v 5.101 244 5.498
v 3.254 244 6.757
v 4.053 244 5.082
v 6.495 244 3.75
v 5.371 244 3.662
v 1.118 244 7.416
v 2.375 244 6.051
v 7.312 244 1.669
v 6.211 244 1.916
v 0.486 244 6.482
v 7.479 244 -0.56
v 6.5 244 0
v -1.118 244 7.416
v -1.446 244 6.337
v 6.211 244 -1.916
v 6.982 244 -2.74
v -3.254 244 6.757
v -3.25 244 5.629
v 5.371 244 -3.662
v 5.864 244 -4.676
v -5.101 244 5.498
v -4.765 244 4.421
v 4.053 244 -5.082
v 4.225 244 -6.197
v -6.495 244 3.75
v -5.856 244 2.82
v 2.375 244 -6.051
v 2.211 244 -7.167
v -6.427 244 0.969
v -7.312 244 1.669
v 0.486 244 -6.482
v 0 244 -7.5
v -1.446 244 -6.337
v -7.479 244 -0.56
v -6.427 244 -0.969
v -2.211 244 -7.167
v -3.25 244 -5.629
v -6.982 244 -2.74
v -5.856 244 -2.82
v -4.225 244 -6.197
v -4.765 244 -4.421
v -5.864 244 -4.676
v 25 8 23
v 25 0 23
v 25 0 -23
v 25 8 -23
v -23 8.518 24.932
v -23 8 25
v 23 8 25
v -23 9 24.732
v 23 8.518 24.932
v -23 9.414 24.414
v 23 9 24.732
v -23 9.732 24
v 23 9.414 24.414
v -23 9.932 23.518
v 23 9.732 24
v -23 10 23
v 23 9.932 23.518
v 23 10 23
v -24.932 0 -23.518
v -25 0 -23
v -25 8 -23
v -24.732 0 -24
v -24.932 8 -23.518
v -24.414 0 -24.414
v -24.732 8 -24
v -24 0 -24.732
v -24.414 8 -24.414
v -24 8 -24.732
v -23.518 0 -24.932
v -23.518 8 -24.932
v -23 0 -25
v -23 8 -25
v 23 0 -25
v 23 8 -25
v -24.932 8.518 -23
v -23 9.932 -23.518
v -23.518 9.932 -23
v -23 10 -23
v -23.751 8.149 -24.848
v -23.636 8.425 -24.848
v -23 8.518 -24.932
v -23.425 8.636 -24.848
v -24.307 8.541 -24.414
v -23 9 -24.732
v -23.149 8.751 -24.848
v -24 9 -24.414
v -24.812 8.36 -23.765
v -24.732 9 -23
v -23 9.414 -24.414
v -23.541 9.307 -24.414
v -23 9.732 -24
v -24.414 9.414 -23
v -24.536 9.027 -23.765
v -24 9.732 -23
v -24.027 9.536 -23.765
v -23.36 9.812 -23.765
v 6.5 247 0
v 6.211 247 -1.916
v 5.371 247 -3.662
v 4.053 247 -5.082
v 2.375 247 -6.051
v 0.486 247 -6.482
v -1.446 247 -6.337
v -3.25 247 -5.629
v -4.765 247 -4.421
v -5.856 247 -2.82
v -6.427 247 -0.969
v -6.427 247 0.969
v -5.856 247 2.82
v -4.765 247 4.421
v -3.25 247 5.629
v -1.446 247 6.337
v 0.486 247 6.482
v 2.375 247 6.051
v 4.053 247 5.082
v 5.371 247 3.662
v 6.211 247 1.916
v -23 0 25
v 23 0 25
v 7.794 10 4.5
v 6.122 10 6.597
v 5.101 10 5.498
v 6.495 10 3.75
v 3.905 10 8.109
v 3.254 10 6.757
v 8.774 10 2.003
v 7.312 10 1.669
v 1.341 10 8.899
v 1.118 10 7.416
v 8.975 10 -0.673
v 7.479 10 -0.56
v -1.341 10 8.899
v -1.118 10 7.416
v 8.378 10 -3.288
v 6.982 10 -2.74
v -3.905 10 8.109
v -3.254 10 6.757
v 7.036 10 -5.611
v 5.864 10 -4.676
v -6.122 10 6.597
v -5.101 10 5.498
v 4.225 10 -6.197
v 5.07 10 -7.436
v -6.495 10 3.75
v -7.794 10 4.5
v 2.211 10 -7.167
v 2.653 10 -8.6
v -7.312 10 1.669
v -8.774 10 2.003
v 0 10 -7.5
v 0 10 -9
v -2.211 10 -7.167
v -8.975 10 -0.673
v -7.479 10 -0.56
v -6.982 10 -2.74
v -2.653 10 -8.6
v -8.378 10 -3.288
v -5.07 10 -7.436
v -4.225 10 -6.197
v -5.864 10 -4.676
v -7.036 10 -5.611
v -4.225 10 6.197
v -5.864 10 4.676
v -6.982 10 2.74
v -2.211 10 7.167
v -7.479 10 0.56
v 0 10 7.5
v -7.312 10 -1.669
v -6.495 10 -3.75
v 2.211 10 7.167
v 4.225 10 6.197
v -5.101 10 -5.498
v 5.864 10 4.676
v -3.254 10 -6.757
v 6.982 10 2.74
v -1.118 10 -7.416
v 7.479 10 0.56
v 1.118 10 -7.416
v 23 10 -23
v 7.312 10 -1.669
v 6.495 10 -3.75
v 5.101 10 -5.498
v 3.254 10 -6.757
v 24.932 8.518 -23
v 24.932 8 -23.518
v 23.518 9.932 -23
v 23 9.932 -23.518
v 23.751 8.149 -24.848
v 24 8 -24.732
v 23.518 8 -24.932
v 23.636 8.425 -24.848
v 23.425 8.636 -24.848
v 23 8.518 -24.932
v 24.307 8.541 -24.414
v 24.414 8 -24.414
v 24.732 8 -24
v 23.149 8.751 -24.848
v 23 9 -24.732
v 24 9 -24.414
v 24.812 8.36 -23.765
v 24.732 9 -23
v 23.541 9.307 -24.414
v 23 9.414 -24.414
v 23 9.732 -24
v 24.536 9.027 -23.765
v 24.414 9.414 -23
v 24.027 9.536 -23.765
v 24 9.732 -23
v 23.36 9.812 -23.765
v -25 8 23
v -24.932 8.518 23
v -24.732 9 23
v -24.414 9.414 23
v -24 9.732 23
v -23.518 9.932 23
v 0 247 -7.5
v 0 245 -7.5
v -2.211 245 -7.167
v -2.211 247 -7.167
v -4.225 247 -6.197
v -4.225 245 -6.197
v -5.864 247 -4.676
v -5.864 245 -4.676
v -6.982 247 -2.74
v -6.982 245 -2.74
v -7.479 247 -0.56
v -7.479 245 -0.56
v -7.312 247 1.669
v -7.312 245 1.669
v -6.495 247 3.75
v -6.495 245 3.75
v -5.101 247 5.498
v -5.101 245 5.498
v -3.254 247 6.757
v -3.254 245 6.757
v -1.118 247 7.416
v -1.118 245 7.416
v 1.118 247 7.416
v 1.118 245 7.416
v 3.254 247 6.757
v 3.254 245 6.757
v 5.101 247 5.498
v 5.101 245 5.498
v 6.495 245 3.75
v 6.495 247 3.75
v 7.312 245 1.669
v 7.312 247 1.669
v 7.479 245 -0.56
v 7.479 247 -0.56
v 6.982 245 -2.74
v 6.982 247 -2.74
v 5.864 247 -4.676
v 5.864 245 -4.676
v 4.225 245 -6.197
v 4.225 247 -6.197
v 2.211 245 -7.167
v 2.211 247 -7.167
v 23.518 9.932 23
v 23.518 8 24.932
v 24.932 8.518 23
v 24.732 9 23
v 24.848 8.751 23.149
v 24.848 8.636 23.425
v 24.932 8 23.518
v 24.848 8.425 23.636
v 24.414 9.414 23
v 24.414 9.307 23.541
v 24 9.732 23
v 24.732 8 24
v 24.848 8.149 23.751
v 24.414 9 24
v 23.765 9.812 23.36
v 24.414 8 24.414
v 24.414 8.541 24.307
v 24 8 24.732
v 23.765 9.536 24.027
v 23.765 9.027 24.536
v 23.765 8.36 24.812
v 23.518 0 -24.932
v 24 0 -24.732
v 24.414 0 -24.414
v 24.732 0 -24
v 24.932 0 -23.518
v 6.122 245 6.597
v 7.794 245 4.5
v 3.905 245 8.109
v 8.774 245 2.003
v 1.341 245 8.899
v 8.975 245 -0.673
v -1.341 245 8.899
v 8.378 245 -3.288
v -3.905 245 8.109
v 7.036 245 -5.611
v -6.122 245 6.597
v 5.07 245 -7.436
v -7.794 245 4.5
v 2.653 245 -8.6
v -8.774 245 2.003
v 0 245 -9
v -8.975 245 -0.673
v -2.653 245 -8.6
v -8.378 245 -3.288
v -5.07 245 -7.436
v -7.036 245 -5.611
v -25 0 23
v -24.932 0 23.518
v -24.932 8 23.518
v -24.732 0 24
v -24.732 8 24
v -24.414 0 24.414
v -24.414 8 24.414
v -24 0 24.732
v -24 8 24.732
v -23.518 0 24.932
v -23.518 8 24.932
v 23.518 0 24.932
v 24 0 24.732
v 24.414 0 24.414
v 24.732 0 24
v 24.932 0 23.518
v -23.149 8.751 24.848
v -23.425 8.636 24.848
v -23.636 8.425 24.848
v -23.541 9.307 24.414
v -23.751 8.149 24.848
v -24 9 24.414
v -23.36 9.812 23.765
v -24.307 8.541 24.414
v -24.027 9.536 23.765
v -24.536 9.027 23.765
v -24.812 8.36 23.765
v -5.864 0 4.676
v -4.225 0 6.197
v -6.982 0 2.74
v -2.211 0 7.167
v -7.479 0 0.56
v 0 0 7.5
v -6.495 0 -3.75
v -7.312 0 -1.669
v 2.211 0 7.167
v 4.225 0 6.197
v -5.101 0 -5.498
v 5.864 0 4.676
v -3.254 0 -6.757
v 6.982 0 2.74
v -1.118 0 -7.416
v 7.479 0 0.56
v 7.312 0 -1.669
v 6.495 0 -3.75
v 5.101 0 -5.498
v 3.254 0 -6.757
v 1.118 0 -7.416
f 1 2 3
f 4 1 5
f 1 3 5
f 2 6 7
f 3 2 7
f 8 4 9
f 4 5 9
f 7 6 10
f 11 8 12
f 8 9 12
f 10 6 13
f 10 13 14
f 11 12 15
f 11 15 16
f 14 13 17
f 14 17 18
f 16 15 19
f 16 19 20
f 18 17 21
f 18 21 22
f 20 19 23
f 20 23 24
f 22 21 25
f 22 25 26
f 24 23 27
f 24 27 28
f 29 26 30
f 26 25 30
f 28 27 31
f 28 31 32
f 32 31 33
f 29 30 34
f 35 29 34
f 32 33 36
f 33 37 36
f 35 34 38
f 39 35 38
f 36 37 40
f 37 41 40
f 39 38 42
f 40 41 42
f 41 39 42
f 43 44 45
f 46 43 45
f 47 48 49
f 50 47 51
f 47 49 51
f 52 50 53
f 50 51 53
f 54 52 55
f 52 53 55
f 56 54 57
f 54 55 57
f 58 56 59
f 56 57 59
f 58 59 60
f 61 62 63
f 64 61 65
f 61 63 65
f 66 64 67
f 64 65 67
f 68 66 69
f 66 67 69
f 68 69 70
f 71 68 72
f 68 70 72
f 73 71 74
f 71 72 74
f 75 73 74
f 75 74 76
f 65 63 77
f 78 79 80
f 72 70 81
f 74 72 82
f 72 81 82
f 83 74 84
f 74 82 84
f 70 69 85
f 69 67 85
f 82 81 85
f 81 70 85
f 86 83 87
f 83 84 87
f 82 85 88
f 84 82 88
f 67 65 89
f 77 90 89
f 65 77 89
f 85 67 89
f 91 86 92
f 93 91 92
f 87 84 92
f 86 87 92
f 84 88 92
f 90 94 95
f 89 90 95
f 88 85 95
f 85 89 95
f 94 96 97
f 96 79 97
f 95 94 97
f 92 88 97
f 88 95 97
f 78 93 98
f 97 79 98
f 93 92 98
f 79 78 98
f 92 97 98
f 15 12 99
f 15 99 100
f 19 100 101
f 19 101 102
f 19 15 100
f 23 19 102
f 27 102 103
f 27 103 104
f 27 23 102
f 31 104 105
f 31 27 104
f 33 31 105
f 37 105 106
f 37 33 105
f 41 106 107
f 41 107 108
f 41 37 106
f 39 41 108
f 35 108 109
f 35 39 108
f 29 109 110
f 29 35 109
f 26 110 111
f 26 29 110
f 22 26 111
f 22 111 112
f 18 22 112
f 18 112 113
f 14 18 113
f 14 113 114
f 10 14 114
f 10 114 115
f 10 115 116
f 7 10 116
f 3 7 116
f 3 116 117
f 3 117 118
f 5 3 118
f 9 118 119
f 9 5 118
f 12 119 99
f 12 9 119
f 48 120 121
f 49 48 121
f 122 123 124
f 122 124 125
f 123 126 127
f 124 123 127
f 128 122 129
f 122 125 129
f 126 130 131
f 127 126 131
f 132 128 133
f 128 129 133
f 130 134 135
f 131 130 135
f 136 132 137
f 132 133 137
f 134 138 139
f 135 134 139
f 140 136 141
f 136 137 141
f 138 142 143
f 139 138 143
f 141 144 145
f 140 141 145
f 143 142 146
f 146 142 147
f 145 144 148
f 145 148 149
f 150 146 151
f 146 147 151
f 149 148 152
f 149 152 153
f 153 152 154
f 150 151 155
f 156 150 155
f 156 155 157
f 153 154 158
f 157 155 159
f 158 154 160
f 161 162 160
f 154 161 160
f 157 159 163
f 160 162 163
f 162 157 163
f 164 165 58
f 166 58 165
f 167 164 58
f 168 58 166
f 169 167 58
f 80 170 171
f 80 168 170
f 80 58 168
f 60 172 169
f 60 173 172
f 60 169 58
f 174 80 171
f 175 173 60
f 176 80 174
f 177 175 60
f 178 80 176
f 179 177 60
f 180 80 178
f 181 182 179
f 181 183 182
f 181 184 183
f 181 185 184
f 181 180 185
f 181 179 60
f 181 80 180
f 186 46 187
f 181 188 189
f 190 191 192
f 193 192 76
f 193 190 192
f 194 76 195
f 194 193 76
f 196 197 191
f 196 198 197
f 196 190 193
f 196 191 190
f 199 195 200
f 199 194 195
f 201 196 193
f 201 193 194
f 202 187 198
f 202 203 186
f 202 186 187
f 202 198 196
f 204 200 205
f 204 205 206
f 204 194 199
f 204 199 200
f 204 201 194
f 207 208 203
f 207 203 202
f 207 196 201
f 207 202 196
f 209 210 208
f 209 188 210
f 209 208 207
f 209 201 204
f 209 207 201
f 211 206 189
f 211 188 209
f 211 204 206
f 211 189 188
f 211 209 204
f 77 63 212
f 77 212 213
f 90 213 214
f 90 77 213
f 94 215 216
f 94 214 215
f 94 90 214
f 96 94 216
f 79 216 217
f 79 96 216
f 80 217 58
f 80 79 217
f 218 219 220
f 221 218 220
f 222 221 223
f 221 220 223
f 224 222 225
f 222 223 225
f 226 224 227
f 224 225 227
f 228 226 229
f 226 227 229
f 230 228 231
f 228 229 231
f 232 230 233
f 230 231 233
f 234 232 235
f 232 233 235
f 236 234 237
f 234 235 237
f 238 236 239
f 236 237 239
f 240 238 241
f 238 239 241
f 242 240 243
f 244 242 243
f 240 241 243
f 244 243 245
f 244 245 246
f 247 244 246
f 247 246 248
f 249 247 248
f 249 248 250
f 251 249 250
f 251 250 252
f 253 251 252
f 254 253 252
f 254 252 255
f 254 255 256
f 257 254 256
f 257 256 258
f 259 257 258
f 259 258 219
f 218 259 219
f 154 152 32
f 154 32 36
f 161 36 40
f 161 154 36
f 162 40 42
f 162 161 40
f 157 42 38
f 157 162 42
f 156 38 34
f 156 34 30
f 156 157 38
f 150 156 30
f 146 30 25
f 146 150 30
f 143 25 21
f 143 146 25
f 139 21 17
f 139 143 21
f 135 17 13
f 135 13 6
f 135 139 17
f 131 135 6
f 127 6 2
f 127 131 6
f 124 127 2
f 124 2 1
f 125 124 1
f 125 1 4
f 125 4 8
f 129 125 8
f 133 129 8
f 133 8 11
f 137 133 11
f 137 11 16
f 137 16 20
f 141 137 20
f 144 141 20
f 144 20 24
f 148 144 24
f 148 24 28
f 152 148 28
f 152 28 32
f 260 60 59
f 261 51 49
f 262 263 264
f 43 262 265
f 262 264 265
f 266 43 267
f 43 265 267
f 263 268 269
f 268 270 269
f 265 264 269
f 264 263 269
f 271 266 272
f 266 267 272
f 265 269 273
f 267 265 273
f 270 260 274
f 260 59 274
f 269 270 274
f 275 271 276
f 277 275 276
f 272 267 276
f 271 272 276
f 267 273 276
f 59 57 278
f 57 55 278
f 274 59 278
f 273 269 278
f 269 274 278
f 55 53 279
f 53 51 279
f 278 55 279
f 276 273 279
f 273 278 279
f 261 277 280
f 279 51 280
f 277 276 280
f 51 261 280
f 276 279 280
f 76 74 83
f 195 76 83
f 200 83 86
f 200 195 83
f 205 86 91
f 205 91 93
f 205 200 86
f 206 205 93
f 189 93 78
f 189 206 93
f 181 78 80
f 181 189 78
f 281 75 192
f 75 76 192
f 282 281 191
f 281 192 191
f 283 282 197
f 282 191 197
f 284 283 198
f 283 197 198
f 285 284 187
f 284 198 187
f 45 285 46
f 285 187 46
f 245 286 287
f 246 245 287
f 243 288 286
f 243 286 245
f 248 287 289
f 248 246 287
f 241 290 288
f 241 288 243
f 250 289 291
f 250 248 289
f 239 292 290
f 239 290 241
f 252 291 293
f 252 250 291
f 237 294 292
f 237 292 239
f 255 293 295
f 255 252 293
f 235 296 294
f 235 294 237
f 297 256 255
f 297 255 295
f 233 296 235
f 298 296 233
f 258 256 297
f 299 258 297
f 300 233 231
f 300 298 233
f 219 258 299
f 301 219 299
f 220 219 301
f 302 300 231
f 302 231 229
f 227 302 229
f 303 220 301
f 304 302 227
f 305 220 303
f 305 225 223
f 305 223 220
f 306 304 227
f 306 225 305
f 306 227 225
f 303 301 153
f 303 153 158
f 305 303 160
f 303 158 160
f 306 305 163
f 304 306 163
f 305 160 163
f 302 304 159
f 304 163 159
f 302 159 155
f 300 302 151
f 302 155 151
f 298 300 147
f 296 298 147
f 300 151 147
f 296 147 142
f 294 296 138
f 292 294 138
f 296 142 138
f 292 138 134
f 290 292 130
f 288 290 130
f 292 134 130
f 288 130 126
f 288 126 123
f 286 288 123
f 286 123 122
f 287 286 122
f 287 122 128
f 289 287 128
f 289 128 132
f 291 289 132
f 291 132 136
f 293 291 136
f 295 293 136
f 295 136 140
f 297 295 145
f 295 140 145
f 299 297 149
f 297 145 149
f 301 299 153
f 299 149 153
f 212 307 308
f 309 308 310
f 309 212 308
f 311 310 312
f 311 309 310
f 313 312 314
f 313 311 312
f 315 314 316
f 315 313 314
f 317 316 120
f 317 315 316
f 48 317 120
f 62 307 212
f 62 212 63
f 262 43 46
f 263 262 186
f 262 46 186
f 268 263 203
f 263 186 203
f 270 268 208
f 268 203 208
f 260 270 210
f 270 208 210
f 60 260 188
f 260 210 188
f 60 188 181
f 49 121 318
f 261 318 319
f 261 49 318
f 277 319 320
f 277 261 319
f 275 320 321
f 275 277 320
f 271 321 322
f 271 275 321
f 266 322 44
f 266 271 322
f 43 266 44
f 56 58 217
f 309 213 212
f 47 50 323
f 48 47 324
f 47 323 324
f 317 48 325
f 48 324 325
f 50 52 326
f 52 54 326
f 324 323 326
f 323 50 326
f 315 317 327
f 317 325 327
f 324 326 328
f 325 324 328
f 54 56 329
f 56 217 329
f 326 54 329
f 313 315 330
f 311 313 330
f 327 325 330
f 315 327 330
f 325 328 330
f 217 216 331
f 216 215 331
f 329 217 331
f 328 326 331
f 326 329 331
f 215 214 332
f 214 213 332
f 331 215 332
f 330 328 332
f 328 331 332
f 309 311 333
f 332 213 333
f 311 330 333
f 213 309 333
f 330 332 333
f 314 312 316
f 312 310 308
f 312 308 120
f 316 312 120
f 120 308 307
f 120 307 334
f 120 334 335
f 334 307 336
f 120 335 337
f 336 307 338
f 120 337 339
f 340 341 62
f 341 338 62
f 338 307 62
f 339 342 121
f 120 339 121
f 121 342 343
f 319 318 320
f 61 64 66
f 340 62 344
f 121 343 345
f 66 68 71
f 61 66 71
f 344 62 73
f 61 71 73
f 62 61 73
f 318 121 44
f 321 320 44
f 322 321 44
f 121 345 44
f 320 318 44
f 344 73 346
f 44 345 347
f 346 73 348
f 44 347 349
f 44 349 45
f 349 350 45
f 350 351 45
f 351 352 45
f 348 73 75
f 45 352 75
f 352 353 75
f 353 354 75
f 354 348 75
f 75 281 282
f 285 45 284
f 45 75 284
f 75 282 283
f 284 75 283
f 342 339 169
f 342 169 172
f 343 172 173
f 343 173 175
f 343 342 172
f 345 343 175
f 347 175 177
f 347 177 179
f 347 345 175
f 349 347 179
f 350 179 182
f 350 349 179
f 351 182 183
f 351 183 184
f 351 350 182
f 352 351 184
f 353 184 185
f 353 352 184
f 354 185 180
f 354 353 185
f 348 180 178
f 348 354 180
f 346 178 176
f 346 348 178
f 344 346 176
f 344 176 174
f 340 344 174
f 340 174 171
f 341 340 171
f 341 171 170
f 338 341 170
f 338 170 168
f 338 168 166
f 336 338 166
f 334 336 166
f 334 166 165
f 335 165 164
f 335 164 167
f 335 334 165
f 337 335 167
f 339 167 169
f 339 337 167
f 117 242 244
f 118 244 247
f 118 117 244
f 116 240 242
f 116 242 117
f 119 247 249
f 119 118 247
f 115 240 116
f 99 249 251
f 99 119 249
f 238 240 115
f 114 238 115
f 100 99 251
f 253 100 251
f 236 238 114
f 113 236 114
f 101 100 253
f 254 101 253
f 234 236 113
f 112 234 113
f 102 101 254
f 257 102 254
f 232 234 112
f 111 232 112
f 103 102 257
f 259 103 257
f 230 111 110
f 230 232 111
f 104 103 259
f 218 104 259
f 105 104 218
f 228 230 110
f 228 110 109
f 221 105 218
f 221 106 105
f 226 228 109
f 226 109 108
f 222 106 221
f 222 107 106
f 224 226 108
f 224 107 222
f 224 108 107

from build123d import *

# Parameters (mm, degrees)
SKETCH_219_W       = 50
SKETCH_219_H       = 50
SKETCH_219_R       = 7.5
EXTRUDE_1_DEPTH    = 10
FILLET_2_R         = 2
SKETCH_982_R       = 9
EXTRUDE_2_DEPTH    = 235
SHELL_6_T          = -1.5
SKETCH_6_R         = 7.5
EXTRUDE_5_DEPTH    = 3
SHELL_START        = 244
SHELL_13_OUTLINE_R = 6.5
SHELL_13_DEPTH     = 3


# Read off the part's stored shape, not the designer's step: 抽壳13
with BuildPart() as part:
    # Sketch 219 → 凸台-拉伸1 (new body)
    with BuildSketch(Plane(origin=(0, 0, 0), x_dir=(1, 0, 0), z_dir=(0, 1, 0))):
        Rectangle(SKETCH_219_W, SKETCH_219_H)
        with Locations(Location((0, 0, 0), (0, 0, 270))):
            Circle(SKETCH_219_R, mode=Mode.SUBTRACT)
    extrude(amount=EXTRUDE_1_DEPTH)

    # 圆角2
    fillet_2_edges = [part.edges().sort_by_distance(p)[0] for p in [
        (-25, 10, 0),
        (0, 10, 25),
        (25, 10, 0),
        (25, 5, 25),
        (-25, 5, 25),
        (-25, 5, -25),
        (25, 5, -25),
        (0, 10, -25),
    ]]
    fillet(fillet_2_edges, radius=FILLET_2_R)


with BuildPart() as body_2:
    # Sketch 982 → 凸台-拉伸2 (new body)
    with BuildSketch(Plane(origin=(0, 10, 0), x_dir=(1, 0, 0), z_dir=(0, 1, 0))):
        with Locations(Location((0, 0, 0), (0, 0, 90))):
            Circle(SKETCH_982_R)
    extrude(amount=EXTRUDE_2_DEPTH)

    # 抽壳6
    shell_6_openings = [body_2.faces().sort_by_distance(p)[0] for p in [
        (0, 245, 0),
        (0, 10, 0),
    ]]
    offset(amount=SHELL_6_T, openings=shell_6_openings, kind=Kind.INTERSECTION)

    # 草图6 → 凸台-拉伸5 (add)
    with BuildSketch(Plane(origin=(0, 244, 0), x_dir=(1, 0, 0), z_dir=(0, 1, 0))):
        with Locations(Location((0, 0, 0), (0, 0, 90))):
            Circle(SKETCH_6_R)
    extrude(amount=EXTRUDE_5_DEPTH)

    # 抽壳13 outline → 抽壳13 (cut)
    with BuildSketch(Plane(origin=(0, 0, 0), x_dir=(1, 0, 0), z_dir=(0, 1, 0)).offset(SHELL_START)):
        Circle(SHELL_13_OUTLINE_R)
    extrude(amount=SHELL_13_DEPTH, mode=Mode.SUBTRACT)


solid = Compound([part.part, body_2.part])
